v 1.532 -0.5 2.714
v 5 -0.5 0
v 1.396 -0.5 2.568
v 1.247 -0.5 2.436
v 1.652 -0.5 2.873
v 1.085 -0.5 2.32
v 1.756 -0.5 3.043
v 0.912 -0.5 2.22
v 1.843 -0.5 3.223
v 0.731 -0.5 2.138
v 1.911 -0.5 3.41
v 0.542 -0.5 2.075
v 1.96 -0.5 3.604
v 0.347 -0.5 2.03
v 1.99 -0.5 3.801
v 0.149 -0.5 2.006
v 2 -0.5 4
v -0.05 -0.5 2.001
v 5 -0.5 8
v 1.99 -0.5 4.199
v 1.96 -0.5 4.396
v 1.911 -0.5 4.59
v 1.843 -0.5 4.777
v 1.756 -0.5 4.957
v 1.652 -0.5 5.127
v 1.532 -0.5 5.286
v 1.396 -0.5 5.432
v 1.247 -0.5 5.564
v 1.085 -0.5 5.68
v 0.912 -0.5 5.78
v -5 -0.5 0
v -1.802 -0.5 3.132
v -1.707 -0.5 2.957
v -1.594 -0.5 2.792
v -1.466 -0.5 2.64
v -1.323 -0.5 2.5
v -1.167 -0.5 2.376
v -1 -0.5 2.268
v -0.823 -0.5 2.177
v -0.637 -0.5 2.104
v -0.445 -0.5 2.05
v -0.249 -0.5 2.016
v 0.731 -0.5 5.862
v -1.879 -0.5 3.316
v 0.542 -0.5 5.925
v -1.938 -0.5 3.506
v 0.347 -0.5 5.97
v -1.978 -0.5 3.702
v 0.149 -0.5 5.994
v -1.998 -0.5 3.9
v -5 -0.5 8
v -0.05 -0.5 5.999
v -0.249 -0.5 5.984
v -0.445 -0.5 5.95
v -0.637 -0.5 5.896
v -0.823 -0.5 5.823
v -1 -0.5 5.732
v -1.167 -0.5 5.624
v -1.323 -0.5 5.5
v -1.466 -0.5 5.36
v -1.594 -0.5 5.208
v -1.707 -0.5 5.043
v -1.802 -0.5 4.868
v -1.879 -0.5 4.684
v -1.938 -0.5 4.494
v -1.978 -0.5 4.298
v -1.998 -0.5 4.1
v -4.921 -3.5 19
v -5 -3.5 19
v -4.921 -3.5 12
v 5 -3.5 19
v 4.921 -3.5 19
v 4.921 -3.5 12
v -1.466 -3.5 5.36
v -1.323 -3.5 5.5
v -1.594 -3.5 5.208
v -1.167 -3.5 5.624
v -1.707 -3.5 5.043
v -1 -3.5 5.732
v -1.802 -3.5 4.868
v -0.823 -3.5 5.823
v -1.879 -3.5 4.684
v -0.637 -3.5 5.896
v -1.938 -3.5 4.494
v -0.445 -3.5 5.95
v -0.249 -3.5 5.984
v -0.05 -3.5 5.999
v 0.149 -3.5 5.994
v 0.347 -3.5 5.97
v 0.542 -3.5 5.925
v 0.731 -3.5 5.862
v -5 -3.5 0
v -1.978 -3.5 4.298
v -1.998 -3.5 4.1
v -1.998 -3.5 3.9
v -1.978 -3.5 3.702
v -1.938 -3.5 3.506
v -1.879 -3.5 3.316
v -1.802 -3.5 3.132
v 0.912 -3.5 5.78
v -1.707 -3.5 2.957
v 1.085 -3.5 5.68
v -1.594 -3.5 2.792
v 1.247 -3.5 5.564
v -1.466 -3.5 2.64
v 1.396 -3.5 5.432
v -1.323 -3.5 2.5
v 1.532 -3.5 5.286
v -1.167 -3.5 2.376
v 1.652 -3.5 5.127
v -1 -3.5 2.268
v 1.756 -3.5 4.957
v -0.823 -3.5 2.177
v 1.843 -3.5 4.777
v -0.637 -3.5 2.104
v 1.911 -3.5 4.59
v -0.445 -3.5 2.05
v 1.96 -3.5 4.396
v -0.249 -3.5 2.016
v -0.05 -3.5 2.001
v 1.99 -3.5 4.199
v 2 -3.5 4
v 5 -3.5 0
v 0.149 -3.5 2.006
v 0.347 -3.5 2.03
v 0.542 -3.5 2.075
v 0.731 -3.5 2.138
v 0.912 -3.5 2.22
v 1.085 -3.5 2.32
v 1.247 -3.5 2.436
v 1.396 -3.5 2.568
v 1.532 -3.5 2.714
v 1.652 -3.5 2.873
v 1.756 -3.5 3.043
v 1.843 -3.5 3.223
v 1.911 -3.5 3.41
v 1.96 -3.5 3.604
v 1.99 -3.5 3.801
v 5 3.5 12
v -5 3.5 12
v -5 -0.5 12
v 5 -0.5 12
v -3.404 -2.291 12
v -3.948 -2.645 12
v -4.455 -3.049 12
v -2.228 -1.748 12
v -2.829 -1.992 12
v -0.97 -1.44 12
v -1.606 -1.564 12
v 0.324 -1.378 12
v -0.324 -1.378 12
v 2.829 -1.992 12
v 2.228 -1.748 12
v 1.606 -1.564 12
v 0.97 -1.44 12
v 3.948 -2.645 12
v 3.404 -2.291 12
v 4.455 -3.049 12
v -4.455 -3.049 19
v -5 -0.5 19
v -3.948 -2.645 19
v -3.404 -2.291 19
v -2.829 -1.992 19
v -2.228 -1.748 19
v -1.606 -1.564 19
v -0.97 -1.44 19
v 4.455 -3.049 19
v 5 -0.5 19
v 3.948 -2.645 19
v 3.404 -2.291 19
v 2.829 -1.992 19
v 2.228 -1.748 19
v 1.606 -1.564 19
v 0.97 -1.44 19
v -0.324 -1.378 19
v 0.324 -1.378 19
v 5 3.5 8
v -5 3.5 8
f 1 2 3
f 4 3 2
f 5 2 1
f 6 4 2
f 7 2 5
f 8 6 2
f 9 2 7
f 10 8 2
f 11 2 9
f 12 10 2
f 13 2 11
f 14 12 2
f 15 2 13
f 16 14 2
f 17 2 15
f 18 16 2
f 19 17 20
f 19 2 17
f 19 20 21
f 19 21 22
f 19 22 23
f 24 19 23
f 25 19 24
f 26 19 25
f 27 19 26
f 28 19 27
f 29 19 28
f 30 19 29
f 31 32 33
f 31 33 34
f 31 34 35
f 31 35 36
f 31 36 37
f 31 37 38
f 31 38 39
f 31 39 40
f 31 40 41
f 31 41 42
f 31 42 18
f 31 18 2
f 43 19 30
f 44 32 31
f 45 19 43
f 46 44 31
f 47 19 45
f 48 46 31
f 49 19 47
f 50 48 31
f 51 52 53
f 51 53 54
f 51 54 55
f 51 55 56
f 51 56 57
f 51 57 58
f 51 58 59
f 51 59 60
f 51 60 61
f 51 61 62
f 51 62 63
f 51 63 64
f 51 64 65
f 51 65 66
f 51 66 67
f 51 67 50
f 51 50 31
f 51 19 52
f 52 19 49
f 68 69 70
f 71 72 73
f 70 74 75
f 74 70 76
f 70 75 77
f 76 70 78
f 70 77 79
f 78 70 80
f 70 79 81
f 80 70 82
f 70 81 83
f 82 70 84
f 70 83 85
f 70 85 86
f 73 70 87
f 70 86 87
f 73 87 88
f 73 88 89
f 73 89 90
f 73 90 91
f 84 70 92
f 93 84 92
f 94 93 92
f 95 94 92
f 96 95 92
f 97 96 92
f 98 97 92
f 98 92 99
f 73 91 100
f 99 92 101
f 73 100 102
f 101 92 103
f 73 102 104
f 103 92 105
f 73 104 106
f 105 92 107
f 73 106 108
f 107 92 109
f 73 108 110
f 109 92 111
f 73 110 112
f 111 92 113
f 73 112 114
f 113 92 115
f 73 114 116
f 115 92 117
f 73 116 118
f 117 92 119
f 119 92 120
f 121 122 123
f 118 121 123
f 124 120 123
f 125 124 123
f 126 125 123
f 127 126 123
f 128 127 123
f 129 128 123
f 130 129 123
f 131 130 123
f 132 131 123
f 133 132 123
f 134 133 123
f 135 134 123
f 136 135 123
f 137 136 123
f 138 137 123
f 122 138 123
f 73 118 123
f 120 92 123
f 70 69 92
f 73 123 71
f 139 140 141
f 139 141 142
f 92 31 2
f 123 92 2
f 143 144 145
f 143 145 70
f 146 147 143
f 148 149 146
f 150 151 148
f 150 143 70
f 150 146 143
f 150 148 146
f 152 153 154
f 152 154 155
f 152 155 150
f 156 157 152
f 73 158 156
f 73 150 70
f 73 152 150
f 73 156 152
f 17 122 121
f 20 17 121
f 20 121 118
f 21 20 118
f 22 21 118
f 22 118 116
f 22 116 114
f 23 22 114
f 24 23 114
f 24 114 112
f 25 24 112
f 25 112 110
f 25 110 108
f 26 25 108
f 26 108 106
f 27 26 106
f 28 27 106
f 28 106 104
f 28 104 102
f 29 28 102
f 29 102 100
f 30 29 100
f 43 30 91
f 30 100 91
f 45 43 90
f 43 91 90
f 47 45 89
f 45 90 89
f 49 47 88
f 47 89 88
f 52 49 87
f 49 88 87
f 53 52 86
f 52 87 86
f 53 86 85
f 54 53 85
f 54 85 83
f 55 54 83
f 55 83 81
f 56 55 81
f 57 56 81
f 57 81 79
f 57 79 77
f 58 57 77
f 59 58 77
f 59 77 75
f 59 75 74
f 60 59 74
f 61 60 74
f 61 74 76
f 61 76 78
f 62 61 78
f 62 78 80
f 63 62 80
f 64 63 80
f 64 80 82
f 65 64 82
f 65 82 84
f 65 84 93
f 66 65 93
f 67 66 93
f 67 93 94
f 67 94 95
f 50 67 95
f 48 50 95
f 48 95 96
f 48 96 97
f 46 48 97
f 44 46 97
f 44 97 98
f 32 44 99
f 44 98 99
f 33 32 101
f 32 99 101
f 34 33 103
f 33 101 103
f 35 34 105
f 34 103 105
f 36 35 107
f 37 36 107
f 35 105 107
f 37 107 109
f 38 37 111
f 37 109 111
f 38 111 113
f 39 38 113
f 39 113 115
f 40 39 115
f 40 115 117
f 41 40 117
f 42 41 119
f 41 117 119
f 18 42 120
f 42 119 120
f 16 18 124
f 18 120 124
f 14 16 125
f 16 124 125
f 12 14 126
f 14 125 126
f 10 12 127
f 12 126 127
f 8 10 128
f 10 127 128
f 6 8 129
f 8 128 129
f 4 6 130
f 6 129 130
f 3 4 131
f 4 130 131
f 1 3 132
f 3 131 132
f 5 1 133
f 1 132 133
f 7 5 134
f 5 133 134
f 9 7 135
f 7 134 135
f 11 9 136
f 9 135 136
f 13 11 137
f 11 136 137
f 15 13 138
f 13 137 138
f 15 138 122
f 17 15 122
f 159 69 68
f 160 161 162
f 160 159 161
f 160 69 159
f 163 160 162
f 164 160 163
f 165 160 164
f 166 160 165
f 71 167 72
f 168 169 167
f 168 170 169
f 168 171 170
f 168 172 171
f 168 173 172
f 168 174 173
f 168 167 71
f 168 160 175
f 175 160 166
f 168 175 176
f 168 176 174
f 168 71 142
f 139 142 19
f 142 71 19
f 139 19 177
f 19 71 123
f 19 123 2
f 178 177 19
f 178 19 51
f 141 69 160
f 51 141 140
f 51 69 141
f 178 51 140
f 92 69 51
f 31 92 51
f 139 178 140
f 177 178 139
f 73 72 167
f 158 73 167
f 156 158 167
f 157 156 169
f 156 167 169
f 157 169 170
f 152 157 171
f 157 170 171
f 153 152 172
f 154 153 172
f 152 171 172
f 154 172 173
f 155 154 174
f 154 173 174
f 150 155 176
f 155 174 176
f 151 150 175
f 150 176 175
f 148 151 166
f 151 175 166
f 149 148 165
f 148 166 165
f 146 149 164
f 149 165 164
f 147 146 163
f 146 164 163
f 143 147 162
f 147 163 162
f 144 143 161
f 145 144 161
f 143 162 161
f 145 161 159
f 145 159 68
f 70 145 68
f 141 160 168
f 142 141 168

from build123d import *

# Parameters (mm, degrees)
F0_W     = 10
F0_H     = 7
F1_DEPTH = 19
F2_W     = 10
F2_H     = 4
F3_DEPTH = 7
F4_R     = 2
F5_DEPTH = 7.001
F6_W     = 10
F6_H     = 8
F7_DEPTH = 4


with BuildPart() as f1:
    # F0 (on Top) → F1 (new body)
    with BuildSketch(Plane.XY):
        Rectangle(F0_W, F0_H)
    extrude(amount=F1_DEPTH)

    # F2 (on face) → F3 (cut)
    with BuildSketch(Plane.XY.offset(19)):
        with BuildLine():
            Line((-4.921189, -3.5), (4.921189, -3.5))
            ThreePointArc((4.921189, -3.5), (0, -1.37), (-4.921189, -3.5))
        make_face()
        with Locations((0, 1.5)):
            Rectangle(F2_W, F2_H)
    extrude(amount=-F3_DEPTH, mode=Mode.SUBTRACT)

    # F4 (on face) → F5 (cut, through all)
    with BuildSketch(Plane.XZ.offset(3.5)):
        with Locations((0, 4)):
            Circle(F4_R)
    extrude(amount=-F5_DEPTH, mode=Mode.SUBTRACT)

    # F6 (on face) → F7 (cut)
    with BuildSketch(Plane(origin=(0, 3.5, 0), x_dir=(-1, 0, 0), z_dir=(0, 1, 0))):
        with Locations((0, 4)):
            Rectangle(F6_W, F6_H)
    extrude(amount=-F7_DEPTH, mode=Mode.SUBTRACT)


solid = f1.part
